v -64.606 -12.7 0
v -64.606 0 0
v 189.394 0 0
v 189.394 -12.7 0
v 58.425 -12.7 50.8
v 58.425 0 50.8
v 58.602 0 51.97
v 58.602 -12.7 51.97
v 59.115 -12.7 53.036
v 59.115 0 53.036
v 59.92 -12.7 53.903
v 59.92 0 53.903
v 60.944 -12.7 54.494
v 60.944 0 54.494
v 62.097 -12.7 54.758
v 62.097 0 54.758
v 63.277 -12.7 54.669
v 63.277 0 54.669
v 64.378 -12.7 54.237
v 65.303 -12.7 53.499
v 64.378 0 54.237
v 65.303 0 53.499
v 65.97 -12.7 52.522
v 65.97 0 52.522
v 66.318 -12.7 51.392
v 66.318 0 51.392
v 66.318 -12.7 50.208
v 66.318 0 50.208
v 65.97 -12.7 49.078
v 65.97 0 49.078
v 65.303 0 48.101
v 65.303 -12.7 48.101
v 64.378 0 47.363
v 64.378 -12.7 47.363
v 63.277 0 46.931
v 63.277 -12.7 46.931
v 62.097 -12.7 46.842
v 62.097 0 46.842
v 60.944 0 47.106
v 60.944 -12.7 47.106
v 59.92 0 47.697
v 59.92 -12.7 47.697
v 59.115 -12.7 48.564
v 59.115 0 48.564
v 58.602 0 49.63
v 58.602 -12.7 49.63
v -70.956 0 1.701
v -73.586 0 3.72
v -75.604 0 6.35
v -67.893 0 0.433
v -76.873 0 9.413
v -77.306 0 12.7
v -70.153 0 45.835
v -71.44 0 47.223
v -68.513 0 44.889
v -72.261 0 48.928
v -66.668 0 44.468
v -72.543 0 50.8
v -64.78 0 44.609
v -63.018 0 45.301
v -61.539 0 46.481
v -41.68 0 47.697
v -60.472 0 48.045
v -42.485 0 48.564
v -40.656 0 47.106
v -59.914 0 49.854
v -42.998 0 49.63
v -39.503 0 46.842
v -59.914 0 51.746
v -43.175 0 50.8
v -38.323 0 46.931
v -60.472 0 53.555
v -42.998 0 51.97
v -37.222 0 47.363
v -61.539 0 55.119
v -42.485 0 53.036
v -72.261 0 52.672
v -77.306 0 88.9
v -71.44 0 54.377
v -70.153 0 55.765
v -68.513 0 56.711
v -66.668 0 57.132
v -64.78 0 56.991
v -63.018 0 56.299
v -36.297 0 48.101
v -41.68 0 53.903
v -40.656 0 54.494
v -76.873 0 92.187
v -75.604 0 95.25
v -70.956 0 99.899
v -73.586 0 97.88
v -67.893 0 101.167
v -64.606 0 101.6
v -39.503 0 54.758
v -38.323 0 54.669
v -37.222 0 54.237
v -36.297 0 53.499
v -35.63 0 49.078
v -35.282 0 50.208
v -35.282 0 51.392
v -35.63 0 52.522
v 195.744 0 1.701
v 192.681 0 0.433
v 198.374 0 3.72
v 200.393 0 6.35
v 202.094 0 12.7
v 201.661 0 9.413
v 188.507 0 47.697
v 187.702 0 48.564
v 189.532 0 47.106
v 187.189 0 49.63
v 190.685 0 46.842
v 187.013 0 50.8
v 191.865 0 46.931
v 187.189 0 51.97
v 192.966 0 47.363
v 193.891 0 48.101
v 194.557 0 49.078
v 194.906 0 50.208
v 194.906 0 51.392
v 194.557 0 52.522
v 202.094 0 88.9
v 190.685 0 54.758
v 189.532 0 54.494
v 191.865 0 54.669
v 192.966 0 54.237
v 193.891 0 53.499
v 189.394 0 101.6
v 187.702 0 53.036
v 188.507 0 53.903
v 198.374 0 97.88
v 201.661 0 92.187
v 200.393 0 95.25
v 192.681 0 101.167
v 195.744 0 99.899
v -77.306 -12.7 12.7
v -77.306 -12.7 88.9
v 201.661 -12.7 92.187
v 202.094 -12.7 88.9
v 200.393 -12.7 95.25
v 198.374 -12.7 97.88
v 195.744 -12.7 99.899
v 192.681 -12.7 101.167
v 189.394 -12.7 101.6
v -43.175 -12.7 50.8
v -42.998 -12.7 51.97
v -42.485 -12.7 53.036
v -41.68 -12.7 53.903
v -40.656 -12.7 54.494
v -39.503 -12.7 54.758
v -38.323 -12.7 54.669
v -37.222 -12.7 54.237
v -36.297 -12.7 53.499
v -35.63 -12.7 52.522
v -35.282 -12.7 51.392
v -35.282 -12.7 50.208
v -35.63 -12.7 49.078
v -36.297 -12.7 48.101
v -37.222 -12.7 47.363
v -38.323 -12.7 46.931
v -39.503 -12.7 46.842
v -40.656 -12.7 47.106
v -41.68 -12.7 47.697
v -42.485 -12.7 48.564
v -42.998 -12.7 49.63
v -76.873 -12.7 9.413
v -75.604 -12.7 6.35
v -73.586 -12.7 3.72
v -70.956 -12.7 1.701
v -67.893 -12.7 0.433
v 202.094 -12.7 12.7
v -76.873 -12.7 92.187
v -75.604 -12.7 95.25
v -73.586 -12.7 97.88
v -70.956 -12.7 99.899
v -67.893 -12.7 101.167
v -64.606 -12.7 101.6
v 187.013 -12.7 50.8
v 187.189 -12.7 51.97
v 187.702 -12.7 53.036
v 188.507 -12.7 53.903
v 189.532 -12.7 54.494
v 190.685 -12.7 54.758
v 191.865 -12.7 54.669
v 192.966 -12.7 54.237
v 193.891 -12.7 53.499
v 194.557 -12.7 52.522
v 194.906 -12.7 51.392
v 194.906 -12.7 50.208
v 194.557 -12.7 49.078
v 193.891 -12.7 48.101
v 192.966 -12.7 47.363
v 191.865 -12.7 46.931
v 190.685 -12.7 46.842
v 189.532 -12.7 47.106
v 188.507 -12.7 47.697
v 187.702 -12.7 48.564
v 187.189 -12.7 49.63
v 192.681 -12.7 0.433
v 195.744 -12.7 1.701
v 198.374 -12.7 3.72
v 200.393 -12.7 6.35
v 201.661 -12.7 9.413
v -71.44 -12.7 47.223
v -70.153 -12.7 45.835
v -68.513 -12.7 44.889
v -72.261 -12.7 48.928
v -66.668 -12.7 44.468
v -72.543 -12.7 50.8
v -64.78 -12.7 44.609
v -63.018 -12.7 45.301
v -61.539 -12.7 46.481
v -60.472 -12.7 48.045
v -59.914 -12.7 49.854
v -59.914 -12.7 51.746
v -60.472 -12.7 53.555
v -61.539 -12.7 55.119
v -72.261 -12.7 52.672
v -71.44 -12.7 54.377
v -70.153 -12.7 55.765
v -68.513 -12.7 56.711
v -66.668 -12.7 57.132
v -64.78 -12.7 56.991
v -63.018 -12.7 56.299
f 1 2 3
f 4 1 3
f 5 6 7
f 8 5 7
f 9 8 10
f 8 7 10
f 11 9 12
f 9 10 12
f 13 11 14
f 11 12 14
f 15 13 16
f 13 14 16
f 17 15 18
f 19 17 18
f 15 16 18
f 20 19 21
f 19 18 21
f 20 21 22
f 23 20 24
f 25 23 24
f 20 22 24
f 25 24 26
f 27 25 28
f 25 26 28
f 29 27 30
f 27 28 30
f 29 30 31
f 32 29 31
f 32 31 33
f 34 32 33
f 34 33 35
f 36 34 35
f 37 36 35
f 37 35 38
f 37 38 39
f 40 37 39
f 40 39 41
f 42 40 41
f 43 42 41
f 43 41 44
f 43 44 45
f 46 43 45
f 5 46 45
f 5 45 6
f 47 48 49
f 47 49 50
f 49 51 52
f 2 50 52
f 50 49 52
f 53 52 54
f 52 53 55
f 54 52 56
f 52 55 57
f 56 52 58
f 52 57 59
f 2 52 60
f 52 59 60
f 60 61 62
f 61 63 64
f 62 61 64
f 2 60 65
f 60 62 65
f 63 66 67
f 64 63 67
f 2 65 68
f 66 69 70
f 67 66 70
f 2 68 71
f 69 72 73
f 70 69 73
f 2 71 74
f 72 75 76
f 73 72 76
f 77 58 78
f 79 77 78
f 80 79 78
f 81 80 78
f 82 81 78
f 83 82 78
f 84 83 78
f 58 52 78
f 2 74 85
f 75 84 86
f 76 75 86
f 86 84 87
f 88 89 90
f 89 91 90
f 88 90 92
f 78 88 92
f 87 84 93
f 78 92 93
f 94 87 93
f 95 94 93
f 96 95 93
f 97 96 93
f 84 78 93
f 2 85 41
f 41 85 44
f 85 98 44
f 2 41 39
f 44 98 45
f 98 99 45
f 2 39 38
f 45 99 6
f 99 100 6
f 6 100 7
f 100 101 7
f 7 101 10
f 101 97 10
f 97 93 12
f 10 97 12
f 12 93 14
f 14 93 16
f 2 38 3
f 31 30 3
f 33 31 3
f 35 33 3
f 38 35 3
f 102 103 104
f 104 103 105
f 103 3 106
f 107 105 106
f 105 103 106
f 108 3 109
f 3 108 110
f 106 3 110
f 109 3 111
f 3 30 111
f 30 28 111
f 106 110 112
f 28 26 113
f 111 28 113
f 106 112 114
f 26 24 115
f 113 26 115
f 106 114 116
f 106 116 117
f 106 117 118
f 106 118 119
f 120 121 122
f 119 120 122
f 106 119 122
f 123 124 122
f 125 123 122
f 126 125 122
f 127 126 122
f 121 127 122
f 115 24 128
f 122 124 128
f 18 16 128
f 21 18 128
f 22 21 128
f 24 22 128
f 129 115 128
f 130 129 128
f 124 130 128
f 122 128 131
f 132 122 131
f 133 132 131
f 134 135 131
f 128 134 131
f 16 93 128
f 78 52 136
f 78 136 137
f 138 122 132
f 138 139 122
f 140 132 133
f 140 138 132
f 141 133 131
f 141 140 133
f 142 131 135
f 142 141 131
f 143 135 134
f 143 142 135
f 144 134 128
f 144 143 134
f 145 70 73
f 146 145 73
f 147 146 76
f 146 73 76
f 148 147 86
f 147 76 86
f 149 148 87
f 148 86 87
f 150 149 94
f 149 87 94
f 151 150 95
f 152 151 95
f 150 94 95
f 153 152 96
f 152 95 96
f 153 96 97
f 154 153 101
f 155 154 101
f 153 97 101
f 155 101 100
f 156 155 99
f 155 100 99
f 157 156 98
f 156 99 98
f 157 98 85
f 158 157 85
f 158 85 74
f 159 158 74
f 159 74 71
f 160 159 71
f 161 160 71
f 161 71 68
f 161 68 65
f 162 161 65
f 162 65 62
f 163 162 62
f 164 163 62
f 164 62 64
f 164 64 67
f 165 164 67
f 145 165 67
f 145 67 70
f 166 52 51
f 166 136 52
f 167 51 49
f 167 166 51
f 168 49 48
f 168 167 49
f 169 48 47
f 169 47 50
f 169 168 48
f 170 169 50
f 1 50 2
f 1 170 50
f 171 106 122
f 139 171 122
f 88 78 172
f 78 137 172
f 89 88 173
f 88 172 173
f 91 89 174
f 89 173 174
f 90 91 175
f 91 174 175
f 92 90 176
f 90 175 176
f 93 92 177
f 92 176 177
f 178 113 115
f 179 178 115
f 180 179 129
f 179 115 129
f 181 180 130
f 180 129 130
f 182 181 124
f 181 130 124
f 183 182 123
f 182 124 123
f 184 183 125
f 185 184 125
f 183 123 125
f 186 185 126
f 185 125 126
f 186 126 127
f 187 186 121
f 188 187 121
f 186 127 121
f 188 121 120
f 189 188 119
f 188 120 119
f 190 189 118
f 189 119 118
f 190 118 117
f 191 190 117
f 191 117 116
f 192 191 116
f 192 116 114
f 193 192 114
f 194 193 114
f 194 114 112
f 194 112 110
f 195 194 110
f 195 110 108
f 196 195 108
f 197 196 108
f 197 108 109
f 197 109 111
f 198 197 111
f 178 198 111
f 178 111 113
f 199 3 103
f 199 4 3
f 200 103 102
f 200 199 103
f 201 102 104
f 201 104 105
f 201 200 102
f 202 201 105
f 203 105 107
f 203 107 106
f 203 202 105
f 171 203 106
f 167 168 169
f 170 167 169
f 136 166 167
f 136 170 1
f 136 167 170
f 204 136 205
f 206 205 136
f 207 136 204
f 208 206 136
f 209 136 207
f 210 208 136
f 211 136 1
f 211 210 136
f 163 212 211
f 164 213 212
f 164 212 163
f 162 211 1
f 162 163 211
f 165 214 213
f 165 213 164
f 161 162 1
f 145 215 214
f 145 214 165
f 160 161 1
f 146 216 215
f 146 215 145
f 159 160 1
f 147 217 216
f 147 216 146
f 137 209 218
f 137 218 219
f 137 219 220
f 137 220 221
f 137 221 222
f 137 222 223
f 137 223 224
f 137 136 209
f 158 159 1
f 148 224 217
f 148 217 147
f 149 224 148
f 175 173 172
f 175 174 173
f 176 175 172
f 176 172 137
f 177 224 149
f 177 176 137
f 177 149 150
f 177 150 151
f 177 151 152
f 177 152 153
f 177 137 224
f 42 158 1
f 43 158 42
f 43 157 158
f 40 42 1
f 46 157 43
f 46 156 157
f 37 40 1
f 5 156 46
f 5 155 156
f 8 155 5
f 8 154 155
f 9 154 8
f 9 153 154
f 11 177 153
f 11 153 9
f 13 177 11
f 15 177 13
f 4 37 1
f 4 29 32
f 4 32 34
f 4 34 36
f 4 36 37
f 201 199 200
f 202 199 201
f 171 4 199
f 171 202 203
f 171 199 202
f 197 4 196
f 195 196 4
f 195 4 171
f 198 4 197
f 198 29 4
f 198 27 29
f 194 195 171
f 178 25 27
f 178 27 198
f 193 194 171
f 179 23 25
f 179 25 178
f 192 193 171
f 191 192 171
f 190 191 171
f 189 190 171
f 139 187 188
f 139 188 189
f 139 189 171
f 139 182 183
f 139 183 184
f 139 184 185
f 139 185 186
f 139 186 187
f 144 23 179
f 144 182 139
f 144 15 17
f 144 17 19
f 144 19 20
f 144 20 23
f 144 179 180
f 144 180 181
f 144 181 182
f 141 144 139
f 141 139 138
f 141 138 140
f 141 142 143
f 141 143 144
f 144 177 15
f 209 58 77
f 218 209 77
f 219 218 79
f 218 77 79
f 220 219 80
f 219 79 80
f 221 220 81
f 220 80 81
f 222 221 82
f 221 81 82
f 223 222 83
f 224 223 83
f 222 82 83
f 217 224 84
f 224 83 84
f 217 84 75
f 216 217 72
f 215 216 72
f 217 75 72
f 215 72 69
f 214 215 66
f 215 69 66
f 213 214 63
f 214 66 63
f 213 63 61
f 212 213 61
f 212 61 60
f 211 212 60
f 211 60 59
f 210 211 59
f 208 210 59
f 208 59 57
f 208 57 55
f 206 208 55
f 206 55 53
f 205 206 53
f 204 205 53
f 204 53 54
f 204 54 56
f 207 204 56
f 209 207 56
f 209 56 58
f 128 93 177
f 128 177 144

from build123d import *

# Parameters (mm, degrees)
F0_W     = 279.4
F0_H     = 101.6
F1_DEPTH = 12.7
F2_R     = 12.7
F4_D     = 7.9375
F6_D     = 7.9375
F8_D     = 12.7


with BuildPart() as f1:
    # F0 (on Front) → F1 (new body)
    with BuildSketch(Plane.XZ):
        with Locations((62.394057, 50.8)):
            Rectangle(F0_W, F0_H)
    extrude(amount=F1_DEPTH)

    # F2
    f2_edges = [f1.edges().sort_by_distance(p)[0] for p in [
        (-77.305943, -6.35, 101.6),
        (-77.305943, -6.35, 0),
        (202.094057, -6.35, 101.6),
        (202.094057, -6.35, 0),
    ]]
    fillet(f2_edges, radius=F2_R)

    # F4 (through all)
    with Locations(Plane.XZ.offset(12.7)):
        with Locations((62.394057, 50.8)):
            Hole(F4_D / 2)

    # F6 (through all)
    with Locations(Plane.XZ.offset(12.7)):
        with Locations((190.981557, 50.8), (-39.205943, 50.8)):
            Hole(F6_D / 2)

    # F8 (through all)
    with Locations(Plane.XZ.offset(12.7)):
        with Locations((-66.193443, 50.8)):
            Hole(F8_D / 2)


solid = f1.part
